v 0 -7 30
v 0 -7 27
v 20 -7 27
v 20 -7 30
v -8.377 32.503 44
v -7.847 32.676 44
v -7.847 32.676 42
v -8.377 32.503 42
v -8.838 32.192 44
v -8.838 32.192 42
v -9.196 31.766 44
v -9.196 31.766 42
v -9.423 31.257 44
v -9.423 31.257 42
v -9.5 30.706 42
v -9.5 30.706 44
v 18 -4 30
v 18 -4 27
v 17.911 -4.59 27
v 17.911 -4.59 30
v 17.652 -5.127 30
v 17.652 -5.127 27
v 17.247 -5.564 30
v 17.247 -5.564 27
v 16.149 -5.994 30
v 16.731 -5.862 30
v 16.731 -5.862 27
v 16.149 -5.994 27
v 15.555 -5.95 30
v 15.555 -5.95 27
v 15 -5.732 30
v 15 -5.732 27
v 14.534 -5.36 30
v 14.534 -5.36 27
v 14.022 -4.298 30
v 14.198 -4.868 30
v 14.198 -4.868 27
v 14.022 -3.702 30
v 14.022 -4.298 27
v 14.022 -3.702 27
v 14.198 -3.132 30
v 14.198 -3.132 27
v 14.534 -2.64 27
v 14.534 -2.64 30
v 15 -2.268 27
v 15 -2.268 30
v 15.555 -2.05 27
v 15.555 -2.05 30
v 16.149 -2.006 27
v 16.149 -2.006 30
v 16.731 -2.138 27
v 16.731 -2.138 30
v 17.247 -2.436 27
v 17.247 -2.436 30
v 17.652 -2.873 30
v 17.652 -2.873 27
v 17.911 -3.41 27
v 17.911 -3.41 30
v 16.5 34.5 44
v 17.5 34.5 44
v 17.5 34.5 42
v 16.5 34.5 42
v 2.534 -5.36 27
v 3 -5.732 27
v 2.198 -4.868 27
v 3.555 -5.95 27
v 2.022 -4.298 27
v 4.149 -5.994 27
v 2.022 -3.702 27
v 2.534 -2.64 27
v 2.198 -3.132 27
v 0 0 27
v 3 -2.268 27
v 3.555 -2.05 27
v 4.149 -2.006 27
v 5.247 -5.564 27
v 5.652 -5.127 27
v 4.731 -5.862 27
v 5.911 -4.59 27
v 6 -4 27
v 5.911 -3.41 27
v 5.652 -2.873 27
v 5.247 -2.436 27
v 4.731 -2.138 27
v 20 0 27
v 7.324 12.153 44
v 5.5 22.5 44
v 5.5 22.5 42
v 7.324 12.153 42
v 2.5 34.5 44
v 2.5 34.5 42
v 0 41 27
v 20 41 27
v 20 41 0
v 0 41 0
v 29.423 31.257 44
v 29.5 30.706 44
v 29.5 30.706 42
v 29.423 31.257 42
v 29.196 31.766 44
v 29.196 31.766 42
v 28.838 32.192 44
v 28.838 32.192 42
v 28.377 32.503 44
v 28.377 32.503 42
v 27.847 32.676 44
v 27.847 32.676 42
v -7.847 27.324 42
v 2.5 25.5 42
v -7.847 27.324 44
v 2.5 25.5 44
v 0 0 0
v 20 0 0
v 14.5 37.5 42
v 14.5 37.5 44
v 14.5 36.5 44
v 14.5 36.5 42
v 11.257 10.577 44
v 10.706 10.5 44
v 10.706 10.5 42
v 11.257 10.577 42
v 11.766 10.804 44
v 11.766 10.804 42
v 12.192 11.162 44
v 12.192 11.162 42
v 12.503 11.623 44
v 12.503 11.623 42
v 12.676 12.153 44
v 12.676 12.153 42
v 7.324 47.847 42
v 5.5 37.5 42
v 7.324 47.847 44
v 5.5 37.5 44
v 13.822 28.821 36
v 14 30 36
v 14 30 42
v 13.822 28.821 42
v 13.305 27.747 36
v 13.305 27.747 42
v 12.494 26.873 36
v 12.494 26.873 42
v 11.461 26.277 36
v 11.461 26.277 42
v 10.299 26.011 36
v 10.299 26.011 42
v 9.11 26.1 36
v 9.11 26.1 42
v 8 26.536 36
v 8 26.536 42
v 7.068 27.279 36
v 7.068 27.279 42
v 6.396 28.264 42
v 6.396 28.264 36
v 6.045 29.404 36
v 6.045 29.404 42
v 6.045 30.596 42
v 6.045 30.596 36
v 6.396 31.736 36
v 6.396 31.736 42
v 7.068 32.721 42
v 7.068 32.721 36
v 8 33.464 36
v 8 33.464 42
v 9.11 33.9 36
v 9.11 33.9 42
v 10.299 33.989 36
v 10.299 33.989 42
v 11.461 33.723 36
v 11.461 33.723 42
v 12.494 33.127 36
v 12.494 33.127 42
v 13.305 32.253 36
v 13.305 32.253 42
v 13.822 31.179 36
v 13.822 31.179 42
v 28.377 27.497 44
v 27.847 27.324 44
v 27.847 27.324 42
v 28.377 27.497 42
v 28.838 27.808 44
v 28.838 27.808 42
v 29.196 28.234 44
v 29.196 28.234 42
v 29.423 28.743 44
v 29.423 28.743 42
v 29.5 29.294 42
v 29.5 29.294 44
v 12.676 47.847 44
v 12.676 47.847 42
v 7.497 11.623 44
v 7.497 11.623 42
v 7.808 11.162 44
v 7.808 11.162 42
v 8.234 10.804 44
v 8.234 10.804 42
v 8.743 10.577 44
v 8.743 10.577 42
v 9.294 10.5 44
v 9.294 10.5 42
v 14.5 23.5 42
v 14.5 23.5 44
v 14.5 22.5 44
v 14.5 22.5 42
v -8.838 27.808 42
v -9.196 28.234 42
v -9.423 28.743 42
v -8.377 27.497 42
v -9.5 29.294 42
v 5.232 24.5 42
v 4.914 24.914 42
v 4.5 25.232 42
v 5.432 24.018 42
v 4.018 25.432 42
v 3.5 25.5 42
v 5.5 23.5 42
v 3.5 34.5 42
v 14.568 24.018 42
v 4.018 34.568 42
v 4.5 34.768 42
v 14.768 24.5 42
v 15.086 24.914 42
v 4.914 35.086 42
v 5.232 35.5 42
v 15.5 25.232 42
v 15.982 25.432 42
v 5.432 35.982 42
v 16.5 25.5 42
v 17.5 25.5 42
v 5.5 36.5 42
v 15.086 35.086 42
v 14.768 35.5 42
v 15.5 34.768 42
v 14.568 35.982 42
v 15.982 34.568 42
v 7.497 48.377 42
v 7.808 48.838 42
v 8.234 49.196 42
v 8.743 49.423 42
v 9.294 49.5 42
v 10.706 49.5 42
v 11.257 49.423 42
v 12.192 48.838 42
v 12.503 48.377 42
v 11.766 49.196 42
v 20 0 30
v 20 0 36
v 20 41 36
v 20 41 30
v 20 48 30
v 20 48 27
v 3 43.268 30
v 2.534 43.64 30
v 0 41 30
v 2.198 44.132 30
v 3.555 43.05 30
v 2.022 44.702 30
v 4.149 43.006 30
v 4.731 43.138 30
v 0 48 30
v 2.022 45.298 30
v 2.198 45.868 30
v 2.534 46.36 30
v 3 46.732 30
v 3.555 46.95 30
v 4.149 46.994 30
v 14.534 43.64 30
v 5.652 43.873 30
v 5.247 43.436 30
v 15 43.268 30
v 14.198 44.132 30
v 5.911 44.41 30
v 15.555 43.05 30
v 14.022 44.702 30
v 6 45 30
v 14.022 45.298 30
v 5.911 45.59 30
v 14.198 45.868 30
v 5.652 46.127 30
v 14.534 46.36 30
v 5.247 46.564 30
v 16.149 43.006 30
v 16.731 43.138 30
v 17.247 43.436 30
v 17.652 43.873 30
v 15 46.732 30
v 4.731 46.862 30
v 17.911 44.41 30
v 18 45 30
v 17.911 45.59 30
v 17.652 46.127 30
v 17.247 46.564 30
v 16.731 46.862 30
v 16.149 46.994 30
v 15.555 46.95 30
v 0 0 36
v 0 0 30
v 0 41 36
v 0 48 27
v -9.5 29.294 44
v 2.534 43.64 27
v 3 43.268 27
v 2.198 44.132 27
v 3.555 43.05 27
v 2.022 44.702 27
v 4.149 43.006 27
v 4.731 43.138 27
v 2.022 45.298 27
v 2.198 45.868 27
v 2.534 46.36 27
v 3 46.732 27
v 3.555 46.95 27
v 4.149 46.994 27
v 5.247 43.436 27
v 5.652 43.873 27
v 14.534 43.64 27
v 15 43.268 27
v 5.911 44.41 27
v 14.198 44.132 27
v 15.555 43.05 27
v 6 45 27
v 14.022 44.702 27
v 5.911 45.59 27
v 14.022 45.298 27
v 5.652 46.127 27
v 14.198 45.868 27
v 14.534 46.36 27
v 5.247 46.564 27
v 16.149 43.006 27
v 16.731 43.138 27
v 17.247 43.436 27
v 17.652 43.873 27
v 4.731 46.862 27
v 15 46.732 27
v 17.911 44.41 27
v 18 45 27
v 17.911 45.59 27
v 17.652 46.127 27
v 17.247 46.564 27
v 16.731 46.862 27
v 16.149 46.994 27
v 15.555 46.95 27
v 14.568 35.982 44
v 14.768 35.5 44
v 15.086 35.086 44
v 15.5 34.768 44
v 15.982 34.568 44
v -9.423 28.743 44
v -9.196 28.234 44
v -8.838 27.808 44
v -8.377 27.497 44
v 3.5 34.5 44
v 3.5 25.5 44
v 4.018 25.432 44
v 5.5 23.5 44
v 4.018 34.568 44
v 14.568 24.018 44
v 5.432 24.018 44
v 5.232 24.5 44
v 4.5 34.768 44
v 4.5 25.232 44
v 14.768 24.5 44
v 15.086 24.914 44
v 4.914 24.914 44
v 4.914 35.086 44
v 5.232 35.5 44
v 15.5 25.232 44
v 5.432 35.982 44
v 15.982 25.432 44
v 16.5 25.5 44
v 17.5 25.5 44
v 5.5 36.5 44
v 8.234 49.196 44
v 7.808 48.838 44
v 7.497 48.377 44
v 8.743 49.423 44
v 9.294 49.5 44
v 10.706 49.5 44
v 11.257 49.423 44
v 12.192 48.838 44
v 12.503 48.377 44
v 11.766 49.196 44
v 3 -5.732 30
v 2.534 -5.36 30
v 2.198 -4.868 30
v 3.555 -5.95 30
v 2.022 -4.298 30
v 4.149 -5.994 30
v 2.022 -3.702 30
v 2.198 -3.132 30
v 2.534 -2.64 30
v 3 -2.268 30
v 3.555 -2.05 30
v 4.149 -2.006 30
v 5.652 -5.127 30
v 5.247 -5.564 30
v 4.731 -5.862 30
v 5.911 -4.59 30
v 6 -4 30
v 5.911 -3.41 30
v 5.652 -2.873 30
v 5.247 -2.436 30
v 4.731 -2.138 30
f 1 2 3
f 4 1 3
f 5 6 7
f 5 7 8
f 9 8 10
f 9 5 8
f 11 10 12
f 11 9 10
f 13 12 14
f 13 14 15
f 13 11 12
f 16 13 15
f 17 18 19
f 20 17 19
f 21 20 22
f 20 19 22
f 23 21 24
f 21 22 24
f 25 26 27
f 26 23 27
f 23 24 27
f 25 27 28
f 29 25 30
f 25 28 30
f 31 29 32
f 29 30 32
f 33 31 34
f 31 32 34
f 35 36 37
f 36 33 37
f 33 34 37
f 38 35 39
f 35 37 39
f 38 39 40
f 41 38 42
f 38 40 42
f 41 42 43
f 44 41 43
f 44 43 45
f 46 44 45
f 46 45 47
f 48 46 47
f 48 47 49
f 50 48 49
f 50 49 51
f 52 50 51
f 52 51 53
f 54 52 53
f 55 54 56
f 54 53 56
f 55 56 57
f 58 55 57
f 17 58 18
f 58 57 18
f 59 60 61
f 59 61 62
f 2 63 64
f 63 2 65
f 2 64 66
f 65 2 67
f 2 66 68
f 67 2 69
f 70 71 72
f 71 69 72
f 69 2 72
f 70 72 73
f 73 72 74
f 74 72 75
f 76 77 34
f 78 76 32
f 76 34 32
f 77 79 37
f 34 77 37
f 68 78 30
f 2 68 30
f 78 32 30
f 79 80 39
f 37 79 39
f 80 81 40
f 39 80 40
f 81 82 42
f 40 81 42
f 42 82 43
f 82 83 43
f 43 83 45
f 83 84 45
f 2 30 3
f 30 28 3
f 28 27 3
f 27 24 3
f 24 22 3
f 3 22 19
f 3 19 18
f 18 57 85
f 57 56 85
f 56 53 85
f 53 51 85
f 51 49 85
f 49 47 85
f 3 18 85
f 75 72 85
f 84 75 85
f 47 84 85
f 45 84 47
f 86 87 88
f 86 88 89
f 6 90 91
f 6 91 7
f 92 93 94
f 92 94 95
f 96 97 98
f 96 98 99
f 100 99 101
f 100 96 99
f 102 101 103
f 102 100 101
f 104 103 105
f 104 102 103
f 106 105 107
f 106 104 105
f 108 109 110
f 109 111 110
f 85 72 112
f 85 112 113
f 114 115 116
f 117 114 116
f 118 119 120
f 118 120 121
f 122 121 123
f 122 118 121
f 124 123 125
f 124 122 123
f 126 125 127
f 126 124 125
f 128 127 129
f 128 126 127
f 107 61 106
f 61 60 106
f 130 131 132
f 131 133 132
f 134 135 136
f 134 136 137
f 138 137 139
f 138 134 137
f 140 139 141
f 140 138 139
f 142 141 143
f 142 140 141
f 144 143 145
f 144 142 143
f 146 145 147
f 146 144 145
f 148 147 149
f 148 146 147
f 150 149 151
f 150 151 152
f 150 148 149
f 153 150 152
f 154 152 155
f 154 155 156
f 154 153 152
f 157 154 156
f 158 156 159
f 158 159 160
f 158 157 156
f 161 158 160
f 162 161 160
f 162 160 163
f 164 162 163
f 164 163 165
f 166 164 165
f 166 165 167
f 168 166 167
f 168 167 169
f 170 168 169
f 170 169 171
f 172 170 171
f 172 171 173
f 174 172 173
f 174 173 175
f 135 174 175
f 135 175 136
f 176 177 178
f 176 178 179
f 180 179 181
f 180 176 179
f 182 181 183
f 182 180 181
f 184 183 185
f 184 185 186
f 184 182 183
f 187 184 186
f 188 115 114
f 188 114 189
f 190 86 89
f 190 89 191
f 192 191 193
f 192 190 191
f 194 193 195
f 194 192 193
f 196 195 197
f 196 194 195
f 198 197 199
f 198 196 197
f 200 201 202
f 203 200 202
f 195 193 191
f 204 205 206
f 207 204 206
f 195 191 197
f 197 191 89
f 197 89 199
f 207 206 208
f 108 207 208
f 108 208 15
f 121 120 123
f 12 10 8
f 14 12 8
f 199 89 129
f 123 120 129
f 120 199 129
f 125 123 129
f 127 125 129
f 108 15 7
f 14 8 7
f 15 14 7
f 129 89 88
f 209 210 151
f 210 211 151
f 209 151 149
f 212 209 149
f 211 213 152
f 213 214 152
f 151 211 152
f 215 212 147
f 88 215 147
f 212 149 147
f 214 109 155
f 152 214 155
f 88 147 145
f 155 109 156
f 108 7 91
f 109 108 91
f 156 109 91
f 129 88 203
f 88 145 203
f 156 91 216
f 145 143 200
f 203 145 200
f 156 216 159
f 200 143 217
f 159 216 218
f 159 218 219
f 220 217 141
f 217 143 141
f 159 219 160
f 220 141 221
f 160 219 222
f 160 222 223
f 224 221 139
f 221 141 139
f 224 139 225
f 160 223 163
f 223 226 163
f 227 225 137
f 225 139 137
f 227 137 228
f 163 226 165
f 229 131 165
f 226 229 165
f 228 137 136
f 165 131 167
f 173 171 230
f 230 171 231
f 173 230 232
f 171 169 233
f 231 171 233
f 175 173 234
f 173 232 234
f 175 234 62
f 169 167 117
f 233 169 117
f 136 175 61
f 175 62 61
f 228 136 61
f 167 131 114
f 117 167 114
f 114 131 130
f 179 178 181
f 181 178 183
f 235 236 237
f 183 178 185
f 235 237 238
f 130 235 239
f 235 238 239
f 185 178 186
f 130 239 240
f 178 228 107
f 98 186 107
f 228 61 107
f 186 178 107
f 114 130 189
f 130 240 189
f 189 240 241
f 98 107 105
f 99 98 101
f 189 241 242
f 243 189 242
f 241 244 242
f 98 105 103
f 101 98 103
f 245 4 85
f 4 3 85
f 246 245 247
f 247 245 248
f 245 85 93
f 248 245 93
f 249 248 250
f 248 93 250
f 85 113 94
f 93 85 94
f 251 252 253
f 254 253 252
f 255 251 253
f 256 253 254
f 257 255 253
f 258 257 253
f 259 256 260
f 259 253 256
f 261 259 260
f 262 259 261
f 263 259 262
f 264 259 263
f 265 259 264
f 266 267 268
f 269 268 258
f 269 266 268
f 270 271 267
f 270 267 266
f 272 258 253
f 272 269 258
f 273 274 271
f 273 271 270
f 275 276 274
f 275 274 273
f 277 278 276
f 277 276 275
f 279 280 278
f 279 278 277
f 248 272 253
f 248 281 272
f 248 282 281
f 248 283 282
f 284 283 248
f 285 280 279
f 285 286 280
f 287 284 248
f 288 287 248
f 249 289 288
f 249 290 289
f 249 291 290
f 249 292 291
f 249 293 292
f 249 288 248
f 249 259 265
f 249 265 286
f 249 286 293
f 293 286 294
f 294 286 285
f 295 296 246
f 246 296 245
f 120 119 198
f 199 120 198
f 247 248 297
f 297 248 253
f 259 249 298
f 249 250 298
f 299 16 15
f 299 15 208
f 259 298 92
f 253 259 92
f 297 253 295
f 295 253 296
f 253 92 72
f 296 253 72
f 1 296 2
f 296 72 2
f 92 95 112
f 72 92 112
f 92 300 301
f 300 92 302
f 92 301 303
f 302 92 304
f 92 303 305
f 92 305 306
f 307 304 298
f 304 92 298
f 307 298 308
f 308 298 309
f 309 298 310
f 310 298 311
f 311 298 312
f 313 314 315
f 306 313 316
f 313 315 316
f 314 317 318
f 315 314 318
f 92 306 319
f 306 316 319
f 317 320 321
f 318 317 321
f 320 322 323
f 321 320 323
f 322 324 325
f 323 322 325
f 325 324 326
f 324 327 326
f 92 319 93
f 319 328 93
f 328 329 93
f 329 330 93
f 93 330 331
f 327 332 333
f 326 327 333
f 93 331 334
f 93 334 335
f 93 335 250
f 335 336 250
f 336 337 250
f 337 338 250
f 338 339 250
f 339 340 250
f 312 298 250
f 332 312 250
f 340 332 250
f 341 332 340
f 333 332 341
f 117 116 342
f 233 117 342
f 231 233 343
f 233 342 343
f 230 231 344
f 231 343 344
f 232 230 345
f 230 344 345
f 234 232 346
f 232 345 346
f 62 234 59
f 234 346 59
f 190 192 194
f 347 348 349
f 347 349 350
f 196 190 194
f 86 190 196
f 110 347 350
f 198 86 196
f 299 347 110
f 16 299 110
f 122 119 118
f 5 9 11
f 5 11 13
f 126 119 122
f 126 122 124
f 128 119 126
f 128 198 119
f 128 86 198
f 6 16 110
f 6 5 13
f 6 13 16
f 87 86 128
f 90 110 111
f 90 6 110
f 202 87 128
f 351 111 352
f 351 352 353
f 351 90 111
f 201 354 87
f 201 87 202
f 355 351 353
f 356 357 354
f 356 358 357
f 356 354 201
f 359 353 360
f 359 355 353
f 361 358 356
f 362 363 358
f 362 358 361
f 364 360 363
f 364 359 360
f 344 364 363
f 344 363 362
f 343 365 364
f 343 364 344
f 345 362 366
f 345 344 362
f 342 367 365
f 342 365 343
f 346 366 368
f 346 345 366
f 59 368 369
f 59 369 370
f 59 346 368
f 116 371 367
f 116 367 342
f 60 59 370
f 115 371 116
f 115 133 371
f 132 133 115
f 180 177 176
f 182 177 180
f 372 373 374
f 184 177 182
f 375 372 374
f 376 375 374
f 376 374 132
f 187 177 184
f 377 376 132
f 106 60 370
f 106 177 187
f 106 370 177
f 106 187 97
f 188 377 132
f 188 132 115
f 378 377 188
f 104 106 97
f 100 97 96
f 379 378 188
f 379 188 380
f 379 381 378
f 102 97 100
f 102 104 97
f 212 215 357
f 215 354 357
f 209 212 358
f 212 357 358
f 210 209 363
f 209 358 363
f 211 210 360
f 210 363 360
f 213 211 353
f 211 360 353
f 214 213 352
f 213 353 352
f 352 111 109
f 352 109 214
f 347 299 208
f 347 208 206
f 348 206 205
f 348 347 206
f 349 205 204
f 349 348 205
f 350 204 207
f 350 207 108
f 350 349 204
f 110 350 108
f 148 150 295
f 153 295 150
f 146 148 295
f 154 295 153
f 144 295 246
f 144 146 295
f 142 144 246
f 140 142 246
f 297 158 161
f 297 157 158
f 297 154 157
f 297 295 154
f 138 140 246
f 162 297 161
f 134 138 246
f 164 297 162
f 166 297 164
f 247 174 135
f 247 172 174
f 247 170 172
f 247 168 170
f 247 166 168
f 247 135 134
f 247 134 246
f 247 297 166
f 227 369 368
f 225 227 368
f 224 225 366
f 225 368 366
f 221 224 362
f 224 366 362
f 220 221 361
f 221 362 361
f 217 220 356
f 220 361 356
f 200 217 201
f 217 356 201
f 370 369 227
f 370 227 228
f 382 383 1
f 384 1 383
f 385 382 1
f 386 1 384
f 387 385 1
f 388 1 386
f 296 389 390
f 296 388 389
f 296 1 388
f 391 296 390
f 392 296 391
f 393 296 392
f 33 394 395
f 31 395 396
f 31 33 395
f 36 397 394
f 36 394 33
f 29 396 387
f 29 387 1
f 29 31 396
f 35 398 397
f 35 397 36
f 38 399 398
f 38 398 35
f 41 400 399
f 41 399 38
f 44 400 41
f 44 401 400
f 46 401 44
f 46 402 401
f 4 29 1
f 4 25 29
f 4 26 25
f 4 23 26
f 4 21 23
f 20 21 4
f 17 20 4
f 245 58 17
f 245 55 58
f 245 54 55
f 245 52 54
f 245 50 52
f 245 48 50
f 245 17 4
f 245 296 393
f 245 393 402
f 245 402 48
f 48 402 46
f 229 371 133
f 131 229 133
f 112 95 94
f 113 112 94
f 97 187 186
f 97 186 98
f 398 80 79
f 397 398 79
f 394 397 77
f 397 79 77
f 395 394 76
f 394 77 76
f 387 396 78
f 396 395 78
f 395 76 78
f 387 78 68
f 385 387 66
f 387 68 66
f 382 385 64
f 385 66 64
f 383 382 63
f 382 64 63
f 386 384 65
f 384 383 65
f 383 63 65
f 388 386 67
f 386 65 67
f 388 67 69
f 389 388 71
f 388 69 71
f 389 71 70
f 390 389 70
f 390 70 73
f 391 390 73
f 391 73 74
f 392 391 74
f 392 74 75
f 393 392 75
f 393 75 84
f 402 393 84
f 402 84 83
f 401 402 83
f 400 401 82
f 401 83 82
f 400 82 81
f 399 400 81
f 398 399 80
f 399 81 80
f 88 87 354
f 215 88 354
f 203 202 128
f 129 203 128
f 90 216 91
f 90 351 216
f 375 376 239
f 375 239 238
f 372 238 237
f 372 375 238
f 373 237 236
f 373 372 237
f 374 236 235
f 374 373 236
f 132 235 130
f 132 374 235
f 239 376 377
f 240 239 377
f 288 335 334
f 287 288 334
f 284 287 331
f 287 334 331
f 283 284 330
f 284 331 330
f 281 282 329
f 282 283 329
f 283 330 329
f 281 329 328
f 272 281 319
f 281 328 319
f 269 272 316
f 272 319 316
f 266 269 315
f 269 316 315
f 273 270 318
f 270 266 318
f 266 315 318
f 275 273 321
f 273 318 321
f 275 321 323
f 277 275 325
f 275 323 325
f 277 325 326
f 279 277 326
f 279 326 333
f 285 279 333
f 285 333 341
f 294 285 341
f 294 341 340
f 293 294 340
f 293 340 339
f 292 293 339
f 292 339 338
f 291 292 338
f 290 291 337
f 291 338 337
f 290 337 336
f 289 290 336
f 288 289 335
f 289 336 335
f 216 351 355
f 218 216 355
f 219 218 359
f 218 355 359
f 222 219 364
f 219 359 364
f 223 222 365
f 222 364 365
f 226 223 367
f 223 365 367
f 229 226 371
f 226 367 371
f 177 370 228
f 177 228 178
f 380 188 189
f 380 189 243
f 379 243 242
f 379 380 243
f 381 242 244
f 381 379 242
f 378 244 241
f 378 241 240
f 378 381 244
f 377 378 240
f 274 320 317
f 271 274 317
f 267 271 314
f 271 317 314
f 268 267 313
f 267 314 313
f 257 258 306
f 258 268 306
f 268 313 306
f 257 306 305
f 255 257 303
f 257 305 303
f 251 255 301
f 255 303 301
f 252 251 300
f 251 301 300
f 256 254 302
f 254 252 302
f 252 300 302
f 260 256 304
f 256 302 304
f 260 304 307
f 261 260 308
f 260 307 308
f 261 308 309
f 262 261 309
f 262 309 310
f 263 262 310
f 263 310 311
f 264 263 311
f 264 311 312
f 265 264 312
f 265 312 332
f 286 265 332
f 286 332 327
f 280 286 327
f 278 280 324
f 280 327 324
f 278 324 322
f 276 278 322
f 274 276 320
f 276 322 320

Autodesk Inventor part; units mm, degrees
ref_plane "YZ Plane" through (0, 0, 0) normal (1, 0, 0) x (0, 1, 0)
ref_plane "XZ Plane" through (0, 0, 0) normal (0, 1, 0) x (-1, 0, 0)
ref_plane "XY Plane" through (0, 0, 0) normal (0, 0, 1) x (1, 0, 0)
sketch "Sketch1" plane through (0, 0, 0) normal (0, 0, 1) x (1, 0, 0)
  line L0 (0, 0) -> (20, 0)
  line L1 (20, 0) -> (20, 41)
  line L2 (20, 41) -> (0, 41)
  line L3 (0, 41) -> (0, 0)
  dimension "d0" = 20
  dimension "d1" = 41
extrude "Extrusion1" add sketch "Sketch1" along normal blind 27
sketch "Sketch2" plane through (0, 0, 27) normal (0, 0, 1) x (1, 0, 0)
  line L0 (0, 41) -> (0, 0) construction
  line L1 (20, 0) -> (20, 41) construction
  line L2 (0, 0) -> (20, 41) construction
  line L3 (20, 41) -> (0, 41) construction
  line L4 (0, 41) -> (20, 0) construction
  line L5 (0, -7) -> (20, -7)
  line L6 (20, -7) -> (20, 48)
  line L7 (20, 48) -> (0, 48)
  line L8 (0, 48) -> (0, -7)
  line L9 (0, -7) -> (20, 48) construction
  line L10 (20, -7) -> (0, 48) construction
  line L11 (0, 41) -> (0, 45) construction
  line L12 (0, 45) -> (20, 45) construction
  line L13 (0, 45) -> (4, 45) construction
  circle A0 centre (4, 45) radius 2
  line L14 (20, 45) -> (16, 45) construction
  circle A1 centre (16, 45) radius 2
  line L15 (0, 0) -> (20, 0) construction
  line L16 (0, 0) -> (0, -4) construction
  line L17 (0, -4) -> (4, -4) construction
  line L18 (20, 0) -> (20, -4) construction
  line L19 (20, -4) -> (16, -4) construction
  circle A2 centre (4, -4) radius 2
  circle A3 centre (16, -4) radius 2
  point P0 (10, 20.5)
  dimension "d4" = 20
  dimension "d5" = 55
  dimension "d6" = 4
  dimension "d7" = 4
  dimension "d8" = 4
  dimension "d9" = 4
  dimension "d10" = 4
  dimension "d11" = 4
  dimension "d12" = 4
  dimension "d13" = 4
  dimension "d14" = 4
  dimension "d15" = 4
  dimension "d16" = 4
extrude "Extrusion2" add sketch "Sketch2" along normal blind 3
sketch "Sketch3" plane through (0, 0, 30) normal (0, 0, 1) x (1, 0, 0)
  line L0 (0, 48) -> (0, 41) construction
  line L1 (0, -7) -> (20, -7) construction
  line L2 (0, 48) -> (20, -7) construction
  line L3 (20, 41) -> (20, 48) construction
  line L4 (0, -7) -> (20, 48) construction
  line L5 (0, 0) -> (20, 0)
  line L6 (20, 0) -> (20, 41)
  line L7 (20, 41) -> (0, 41)
  line L8 (0, 41) -> (0, 0)
  line L9 (0, 0) -> (20, 41) construction
  line L10 (20, 0) -> (0, 41) construction
  point P0 (10, 20.5)
  dimension "d19" = 20
  dimension "d20" = 41
extrude "Extrusion3" add sketch "Sketch3" along normal blind 6
sketch "Sketch4" plane through (0, 0, 36) normal (0, 0, 1) x (1, 0, 0)
  line L0 (20, 48) -> (0, 48) construction
  line L1 (10, 48) -> (10, 30) construction
  circle A0 centre (10, 30) radius 4
  point P0 (0, 0)
  dimension "d23" = 18
  dimension "d24" = 8
extrude "Extrusion4" add sketch "Sketch4" along normal blind 8
sketch "Sketch5" plane through (10, 30, 44) normal (0, 0, 1) x (1, 0, 0)
  line L0 (19.5, -0.7059) -> (19.5, 0.7059)
  line L1 (-19.5, 0.7059) -> (-19.5, -0.7059)
  line L2 (-19.5, -4.5) -> (19.5, 4.5) construction
  line L3 (19.5, -4.5) -> (-19.5, 4.5) construction
  line L4 (-0.7059, 19.5) -> (0.7059, 19.5)
  line L5 (0.7059, -19.5) -> (-0.7059, -19.5)
  line L6 (-4.5, 19.5) -> (4.5, -19.5) construction
  line L7 (4.5, 19.5) -> (-4.5, -19.5) construction
  line L8 (4.5, 7.5) -> (4.5, 6.5)
  line L9 (4.5, -6.5) -> (4.5, -7.5)
  line L10 (-4.5, -7.5) -> (-4.5, -6.5)
  line L11 (-4.5, 6.5) -> (-4.5, 7.5)
  line L12 (-7.5, -4.5) -> (-6.5, -4.5)
  line L13 (6.5, -4.5) -> (7.5, -4.5)
  line L14 (7.5, 4.5) -> (6.5, 4.5)
  line L15 (-6.5, 4.5) -> (-7.5, 4.5)
  arc A0 (-6.5, 4.5) -> (-4.5, 6.5) centre (-6.5, 6.5) ccw
  arc A1 (4.5, 6.5) -> (6.5, 4.5) centre (6.5, 6.5) ccw
  arc A2 (6.5, -4.5) -> (4.5, -6.5) centre (6.5, -6.5) ccw
  arc A3 (-4.5, -6.5) -> (-6.5, -4.5) centre (-6.5, -6.5) ccw
  line L16 (4.5, 7.5) -> (2.6755, 17.8473)
  line L17 (-4.5, 7.5) -> (-2.6755, 17.8473)
  line L18 (7.5, -4.5) -> (17.8473, -2.6755)
  line L19 (7.5, 4.5) -> (17.8473, 2.6755)
  line L20 (-7.5, 4.5) -> (-17.8473, 2.6755)
  line L21 (-7.5, -4.5) -> (-17.8473, -2.6755)
  line L22 (-4.5, -7.5) -> (-2.6755, -17.8473)
  line L23 (4.5, -7.5) -> (2.6755, -17.8473)
  arc A4 (-17.8473, 2.6755) -> (-19.5, 0.7059) centre (-17.5, 0.7059) ccw
  arc A5 (-19.5, -0.7059) -> (-17.8473, -2.6755) centre (-17.5, -0.7059) ccw
  arc A6 (-0.7059, 19.5) -> (-2.6755, 17.8473) centre (-0.7059, 17.5) ccw
  arc A7 (2.6755, 17.8473) -> (0.7059, 19.5) centre (0.7059, 17.5) ccw
  arc A8 (19.5, 0.7059) -> (17.8473, 2.6755) centre (17.5, 0.7059) ccw
  arc A9 (17.8473, -2.6755) -> (19.5, -0.7059) centre (17.5, -0.7059) ccw
  arc A10 (-2.6755, -17.8473) -> (-0.7059, -19.5) centre (-0.7059, -17.5) ccw
  arc A11 (0.7059, -19.5) -> (2.6755, -17.8473) centre (0.7059, -17.5) ccw
  point P0 (-10, -30)
  point P1 (0, 0)
  point P2 (0, 0)
  dimension "d27" = 39
  dimension "d28" = 9
  dimension "d29" = 9
  dimension "d30" = 39
  dimension "d31" = 29.5
  dimension "d32" = 49.5
  dimension "d33" = 2
  dimension "d34" = 12
  dimension "d35" = 10
  dimension "d36" = 12
  dimension "d37" = 10
  dimension "d38" = 12
  dimension "d39" = 10
  dimension "d40" = 12
  dimension "d41" = 10
  dimension "d42" = 12
  dimension "d43" = 10
  dimension "d44" = 12
  dimension "d45" = 10
  dimension "d46" = 12
  dimension "d47" = 10
  dimension "d48" = 12
  dimension "d49" = 10
  dimension "d50" = 2
  dimension "d51" = 2
extrude "Extrusion5" add sketch "Sketch5" against normal blind 2
equation "\"d36\" = d34"
equation "\"d37\" = d35"
equation "\"d38\" = d34"
equation "\"d39\" = d35"
equation "\"d40\" = d34"
equation "\"d41\" = d35"
equation "\"d42\" = d34"
equation "\"d43\" = d35"
equation "\"d44\" = d34"
equation "\"d45\" = d35"
equation "\"d46\" = d34"
equation "\"d47\" = d35"
equation "\"d48\" = d34"
equation "\"d49\" = d35"
properties part number "FutabaS3003Rough" material "PC/ABS Plastic"
